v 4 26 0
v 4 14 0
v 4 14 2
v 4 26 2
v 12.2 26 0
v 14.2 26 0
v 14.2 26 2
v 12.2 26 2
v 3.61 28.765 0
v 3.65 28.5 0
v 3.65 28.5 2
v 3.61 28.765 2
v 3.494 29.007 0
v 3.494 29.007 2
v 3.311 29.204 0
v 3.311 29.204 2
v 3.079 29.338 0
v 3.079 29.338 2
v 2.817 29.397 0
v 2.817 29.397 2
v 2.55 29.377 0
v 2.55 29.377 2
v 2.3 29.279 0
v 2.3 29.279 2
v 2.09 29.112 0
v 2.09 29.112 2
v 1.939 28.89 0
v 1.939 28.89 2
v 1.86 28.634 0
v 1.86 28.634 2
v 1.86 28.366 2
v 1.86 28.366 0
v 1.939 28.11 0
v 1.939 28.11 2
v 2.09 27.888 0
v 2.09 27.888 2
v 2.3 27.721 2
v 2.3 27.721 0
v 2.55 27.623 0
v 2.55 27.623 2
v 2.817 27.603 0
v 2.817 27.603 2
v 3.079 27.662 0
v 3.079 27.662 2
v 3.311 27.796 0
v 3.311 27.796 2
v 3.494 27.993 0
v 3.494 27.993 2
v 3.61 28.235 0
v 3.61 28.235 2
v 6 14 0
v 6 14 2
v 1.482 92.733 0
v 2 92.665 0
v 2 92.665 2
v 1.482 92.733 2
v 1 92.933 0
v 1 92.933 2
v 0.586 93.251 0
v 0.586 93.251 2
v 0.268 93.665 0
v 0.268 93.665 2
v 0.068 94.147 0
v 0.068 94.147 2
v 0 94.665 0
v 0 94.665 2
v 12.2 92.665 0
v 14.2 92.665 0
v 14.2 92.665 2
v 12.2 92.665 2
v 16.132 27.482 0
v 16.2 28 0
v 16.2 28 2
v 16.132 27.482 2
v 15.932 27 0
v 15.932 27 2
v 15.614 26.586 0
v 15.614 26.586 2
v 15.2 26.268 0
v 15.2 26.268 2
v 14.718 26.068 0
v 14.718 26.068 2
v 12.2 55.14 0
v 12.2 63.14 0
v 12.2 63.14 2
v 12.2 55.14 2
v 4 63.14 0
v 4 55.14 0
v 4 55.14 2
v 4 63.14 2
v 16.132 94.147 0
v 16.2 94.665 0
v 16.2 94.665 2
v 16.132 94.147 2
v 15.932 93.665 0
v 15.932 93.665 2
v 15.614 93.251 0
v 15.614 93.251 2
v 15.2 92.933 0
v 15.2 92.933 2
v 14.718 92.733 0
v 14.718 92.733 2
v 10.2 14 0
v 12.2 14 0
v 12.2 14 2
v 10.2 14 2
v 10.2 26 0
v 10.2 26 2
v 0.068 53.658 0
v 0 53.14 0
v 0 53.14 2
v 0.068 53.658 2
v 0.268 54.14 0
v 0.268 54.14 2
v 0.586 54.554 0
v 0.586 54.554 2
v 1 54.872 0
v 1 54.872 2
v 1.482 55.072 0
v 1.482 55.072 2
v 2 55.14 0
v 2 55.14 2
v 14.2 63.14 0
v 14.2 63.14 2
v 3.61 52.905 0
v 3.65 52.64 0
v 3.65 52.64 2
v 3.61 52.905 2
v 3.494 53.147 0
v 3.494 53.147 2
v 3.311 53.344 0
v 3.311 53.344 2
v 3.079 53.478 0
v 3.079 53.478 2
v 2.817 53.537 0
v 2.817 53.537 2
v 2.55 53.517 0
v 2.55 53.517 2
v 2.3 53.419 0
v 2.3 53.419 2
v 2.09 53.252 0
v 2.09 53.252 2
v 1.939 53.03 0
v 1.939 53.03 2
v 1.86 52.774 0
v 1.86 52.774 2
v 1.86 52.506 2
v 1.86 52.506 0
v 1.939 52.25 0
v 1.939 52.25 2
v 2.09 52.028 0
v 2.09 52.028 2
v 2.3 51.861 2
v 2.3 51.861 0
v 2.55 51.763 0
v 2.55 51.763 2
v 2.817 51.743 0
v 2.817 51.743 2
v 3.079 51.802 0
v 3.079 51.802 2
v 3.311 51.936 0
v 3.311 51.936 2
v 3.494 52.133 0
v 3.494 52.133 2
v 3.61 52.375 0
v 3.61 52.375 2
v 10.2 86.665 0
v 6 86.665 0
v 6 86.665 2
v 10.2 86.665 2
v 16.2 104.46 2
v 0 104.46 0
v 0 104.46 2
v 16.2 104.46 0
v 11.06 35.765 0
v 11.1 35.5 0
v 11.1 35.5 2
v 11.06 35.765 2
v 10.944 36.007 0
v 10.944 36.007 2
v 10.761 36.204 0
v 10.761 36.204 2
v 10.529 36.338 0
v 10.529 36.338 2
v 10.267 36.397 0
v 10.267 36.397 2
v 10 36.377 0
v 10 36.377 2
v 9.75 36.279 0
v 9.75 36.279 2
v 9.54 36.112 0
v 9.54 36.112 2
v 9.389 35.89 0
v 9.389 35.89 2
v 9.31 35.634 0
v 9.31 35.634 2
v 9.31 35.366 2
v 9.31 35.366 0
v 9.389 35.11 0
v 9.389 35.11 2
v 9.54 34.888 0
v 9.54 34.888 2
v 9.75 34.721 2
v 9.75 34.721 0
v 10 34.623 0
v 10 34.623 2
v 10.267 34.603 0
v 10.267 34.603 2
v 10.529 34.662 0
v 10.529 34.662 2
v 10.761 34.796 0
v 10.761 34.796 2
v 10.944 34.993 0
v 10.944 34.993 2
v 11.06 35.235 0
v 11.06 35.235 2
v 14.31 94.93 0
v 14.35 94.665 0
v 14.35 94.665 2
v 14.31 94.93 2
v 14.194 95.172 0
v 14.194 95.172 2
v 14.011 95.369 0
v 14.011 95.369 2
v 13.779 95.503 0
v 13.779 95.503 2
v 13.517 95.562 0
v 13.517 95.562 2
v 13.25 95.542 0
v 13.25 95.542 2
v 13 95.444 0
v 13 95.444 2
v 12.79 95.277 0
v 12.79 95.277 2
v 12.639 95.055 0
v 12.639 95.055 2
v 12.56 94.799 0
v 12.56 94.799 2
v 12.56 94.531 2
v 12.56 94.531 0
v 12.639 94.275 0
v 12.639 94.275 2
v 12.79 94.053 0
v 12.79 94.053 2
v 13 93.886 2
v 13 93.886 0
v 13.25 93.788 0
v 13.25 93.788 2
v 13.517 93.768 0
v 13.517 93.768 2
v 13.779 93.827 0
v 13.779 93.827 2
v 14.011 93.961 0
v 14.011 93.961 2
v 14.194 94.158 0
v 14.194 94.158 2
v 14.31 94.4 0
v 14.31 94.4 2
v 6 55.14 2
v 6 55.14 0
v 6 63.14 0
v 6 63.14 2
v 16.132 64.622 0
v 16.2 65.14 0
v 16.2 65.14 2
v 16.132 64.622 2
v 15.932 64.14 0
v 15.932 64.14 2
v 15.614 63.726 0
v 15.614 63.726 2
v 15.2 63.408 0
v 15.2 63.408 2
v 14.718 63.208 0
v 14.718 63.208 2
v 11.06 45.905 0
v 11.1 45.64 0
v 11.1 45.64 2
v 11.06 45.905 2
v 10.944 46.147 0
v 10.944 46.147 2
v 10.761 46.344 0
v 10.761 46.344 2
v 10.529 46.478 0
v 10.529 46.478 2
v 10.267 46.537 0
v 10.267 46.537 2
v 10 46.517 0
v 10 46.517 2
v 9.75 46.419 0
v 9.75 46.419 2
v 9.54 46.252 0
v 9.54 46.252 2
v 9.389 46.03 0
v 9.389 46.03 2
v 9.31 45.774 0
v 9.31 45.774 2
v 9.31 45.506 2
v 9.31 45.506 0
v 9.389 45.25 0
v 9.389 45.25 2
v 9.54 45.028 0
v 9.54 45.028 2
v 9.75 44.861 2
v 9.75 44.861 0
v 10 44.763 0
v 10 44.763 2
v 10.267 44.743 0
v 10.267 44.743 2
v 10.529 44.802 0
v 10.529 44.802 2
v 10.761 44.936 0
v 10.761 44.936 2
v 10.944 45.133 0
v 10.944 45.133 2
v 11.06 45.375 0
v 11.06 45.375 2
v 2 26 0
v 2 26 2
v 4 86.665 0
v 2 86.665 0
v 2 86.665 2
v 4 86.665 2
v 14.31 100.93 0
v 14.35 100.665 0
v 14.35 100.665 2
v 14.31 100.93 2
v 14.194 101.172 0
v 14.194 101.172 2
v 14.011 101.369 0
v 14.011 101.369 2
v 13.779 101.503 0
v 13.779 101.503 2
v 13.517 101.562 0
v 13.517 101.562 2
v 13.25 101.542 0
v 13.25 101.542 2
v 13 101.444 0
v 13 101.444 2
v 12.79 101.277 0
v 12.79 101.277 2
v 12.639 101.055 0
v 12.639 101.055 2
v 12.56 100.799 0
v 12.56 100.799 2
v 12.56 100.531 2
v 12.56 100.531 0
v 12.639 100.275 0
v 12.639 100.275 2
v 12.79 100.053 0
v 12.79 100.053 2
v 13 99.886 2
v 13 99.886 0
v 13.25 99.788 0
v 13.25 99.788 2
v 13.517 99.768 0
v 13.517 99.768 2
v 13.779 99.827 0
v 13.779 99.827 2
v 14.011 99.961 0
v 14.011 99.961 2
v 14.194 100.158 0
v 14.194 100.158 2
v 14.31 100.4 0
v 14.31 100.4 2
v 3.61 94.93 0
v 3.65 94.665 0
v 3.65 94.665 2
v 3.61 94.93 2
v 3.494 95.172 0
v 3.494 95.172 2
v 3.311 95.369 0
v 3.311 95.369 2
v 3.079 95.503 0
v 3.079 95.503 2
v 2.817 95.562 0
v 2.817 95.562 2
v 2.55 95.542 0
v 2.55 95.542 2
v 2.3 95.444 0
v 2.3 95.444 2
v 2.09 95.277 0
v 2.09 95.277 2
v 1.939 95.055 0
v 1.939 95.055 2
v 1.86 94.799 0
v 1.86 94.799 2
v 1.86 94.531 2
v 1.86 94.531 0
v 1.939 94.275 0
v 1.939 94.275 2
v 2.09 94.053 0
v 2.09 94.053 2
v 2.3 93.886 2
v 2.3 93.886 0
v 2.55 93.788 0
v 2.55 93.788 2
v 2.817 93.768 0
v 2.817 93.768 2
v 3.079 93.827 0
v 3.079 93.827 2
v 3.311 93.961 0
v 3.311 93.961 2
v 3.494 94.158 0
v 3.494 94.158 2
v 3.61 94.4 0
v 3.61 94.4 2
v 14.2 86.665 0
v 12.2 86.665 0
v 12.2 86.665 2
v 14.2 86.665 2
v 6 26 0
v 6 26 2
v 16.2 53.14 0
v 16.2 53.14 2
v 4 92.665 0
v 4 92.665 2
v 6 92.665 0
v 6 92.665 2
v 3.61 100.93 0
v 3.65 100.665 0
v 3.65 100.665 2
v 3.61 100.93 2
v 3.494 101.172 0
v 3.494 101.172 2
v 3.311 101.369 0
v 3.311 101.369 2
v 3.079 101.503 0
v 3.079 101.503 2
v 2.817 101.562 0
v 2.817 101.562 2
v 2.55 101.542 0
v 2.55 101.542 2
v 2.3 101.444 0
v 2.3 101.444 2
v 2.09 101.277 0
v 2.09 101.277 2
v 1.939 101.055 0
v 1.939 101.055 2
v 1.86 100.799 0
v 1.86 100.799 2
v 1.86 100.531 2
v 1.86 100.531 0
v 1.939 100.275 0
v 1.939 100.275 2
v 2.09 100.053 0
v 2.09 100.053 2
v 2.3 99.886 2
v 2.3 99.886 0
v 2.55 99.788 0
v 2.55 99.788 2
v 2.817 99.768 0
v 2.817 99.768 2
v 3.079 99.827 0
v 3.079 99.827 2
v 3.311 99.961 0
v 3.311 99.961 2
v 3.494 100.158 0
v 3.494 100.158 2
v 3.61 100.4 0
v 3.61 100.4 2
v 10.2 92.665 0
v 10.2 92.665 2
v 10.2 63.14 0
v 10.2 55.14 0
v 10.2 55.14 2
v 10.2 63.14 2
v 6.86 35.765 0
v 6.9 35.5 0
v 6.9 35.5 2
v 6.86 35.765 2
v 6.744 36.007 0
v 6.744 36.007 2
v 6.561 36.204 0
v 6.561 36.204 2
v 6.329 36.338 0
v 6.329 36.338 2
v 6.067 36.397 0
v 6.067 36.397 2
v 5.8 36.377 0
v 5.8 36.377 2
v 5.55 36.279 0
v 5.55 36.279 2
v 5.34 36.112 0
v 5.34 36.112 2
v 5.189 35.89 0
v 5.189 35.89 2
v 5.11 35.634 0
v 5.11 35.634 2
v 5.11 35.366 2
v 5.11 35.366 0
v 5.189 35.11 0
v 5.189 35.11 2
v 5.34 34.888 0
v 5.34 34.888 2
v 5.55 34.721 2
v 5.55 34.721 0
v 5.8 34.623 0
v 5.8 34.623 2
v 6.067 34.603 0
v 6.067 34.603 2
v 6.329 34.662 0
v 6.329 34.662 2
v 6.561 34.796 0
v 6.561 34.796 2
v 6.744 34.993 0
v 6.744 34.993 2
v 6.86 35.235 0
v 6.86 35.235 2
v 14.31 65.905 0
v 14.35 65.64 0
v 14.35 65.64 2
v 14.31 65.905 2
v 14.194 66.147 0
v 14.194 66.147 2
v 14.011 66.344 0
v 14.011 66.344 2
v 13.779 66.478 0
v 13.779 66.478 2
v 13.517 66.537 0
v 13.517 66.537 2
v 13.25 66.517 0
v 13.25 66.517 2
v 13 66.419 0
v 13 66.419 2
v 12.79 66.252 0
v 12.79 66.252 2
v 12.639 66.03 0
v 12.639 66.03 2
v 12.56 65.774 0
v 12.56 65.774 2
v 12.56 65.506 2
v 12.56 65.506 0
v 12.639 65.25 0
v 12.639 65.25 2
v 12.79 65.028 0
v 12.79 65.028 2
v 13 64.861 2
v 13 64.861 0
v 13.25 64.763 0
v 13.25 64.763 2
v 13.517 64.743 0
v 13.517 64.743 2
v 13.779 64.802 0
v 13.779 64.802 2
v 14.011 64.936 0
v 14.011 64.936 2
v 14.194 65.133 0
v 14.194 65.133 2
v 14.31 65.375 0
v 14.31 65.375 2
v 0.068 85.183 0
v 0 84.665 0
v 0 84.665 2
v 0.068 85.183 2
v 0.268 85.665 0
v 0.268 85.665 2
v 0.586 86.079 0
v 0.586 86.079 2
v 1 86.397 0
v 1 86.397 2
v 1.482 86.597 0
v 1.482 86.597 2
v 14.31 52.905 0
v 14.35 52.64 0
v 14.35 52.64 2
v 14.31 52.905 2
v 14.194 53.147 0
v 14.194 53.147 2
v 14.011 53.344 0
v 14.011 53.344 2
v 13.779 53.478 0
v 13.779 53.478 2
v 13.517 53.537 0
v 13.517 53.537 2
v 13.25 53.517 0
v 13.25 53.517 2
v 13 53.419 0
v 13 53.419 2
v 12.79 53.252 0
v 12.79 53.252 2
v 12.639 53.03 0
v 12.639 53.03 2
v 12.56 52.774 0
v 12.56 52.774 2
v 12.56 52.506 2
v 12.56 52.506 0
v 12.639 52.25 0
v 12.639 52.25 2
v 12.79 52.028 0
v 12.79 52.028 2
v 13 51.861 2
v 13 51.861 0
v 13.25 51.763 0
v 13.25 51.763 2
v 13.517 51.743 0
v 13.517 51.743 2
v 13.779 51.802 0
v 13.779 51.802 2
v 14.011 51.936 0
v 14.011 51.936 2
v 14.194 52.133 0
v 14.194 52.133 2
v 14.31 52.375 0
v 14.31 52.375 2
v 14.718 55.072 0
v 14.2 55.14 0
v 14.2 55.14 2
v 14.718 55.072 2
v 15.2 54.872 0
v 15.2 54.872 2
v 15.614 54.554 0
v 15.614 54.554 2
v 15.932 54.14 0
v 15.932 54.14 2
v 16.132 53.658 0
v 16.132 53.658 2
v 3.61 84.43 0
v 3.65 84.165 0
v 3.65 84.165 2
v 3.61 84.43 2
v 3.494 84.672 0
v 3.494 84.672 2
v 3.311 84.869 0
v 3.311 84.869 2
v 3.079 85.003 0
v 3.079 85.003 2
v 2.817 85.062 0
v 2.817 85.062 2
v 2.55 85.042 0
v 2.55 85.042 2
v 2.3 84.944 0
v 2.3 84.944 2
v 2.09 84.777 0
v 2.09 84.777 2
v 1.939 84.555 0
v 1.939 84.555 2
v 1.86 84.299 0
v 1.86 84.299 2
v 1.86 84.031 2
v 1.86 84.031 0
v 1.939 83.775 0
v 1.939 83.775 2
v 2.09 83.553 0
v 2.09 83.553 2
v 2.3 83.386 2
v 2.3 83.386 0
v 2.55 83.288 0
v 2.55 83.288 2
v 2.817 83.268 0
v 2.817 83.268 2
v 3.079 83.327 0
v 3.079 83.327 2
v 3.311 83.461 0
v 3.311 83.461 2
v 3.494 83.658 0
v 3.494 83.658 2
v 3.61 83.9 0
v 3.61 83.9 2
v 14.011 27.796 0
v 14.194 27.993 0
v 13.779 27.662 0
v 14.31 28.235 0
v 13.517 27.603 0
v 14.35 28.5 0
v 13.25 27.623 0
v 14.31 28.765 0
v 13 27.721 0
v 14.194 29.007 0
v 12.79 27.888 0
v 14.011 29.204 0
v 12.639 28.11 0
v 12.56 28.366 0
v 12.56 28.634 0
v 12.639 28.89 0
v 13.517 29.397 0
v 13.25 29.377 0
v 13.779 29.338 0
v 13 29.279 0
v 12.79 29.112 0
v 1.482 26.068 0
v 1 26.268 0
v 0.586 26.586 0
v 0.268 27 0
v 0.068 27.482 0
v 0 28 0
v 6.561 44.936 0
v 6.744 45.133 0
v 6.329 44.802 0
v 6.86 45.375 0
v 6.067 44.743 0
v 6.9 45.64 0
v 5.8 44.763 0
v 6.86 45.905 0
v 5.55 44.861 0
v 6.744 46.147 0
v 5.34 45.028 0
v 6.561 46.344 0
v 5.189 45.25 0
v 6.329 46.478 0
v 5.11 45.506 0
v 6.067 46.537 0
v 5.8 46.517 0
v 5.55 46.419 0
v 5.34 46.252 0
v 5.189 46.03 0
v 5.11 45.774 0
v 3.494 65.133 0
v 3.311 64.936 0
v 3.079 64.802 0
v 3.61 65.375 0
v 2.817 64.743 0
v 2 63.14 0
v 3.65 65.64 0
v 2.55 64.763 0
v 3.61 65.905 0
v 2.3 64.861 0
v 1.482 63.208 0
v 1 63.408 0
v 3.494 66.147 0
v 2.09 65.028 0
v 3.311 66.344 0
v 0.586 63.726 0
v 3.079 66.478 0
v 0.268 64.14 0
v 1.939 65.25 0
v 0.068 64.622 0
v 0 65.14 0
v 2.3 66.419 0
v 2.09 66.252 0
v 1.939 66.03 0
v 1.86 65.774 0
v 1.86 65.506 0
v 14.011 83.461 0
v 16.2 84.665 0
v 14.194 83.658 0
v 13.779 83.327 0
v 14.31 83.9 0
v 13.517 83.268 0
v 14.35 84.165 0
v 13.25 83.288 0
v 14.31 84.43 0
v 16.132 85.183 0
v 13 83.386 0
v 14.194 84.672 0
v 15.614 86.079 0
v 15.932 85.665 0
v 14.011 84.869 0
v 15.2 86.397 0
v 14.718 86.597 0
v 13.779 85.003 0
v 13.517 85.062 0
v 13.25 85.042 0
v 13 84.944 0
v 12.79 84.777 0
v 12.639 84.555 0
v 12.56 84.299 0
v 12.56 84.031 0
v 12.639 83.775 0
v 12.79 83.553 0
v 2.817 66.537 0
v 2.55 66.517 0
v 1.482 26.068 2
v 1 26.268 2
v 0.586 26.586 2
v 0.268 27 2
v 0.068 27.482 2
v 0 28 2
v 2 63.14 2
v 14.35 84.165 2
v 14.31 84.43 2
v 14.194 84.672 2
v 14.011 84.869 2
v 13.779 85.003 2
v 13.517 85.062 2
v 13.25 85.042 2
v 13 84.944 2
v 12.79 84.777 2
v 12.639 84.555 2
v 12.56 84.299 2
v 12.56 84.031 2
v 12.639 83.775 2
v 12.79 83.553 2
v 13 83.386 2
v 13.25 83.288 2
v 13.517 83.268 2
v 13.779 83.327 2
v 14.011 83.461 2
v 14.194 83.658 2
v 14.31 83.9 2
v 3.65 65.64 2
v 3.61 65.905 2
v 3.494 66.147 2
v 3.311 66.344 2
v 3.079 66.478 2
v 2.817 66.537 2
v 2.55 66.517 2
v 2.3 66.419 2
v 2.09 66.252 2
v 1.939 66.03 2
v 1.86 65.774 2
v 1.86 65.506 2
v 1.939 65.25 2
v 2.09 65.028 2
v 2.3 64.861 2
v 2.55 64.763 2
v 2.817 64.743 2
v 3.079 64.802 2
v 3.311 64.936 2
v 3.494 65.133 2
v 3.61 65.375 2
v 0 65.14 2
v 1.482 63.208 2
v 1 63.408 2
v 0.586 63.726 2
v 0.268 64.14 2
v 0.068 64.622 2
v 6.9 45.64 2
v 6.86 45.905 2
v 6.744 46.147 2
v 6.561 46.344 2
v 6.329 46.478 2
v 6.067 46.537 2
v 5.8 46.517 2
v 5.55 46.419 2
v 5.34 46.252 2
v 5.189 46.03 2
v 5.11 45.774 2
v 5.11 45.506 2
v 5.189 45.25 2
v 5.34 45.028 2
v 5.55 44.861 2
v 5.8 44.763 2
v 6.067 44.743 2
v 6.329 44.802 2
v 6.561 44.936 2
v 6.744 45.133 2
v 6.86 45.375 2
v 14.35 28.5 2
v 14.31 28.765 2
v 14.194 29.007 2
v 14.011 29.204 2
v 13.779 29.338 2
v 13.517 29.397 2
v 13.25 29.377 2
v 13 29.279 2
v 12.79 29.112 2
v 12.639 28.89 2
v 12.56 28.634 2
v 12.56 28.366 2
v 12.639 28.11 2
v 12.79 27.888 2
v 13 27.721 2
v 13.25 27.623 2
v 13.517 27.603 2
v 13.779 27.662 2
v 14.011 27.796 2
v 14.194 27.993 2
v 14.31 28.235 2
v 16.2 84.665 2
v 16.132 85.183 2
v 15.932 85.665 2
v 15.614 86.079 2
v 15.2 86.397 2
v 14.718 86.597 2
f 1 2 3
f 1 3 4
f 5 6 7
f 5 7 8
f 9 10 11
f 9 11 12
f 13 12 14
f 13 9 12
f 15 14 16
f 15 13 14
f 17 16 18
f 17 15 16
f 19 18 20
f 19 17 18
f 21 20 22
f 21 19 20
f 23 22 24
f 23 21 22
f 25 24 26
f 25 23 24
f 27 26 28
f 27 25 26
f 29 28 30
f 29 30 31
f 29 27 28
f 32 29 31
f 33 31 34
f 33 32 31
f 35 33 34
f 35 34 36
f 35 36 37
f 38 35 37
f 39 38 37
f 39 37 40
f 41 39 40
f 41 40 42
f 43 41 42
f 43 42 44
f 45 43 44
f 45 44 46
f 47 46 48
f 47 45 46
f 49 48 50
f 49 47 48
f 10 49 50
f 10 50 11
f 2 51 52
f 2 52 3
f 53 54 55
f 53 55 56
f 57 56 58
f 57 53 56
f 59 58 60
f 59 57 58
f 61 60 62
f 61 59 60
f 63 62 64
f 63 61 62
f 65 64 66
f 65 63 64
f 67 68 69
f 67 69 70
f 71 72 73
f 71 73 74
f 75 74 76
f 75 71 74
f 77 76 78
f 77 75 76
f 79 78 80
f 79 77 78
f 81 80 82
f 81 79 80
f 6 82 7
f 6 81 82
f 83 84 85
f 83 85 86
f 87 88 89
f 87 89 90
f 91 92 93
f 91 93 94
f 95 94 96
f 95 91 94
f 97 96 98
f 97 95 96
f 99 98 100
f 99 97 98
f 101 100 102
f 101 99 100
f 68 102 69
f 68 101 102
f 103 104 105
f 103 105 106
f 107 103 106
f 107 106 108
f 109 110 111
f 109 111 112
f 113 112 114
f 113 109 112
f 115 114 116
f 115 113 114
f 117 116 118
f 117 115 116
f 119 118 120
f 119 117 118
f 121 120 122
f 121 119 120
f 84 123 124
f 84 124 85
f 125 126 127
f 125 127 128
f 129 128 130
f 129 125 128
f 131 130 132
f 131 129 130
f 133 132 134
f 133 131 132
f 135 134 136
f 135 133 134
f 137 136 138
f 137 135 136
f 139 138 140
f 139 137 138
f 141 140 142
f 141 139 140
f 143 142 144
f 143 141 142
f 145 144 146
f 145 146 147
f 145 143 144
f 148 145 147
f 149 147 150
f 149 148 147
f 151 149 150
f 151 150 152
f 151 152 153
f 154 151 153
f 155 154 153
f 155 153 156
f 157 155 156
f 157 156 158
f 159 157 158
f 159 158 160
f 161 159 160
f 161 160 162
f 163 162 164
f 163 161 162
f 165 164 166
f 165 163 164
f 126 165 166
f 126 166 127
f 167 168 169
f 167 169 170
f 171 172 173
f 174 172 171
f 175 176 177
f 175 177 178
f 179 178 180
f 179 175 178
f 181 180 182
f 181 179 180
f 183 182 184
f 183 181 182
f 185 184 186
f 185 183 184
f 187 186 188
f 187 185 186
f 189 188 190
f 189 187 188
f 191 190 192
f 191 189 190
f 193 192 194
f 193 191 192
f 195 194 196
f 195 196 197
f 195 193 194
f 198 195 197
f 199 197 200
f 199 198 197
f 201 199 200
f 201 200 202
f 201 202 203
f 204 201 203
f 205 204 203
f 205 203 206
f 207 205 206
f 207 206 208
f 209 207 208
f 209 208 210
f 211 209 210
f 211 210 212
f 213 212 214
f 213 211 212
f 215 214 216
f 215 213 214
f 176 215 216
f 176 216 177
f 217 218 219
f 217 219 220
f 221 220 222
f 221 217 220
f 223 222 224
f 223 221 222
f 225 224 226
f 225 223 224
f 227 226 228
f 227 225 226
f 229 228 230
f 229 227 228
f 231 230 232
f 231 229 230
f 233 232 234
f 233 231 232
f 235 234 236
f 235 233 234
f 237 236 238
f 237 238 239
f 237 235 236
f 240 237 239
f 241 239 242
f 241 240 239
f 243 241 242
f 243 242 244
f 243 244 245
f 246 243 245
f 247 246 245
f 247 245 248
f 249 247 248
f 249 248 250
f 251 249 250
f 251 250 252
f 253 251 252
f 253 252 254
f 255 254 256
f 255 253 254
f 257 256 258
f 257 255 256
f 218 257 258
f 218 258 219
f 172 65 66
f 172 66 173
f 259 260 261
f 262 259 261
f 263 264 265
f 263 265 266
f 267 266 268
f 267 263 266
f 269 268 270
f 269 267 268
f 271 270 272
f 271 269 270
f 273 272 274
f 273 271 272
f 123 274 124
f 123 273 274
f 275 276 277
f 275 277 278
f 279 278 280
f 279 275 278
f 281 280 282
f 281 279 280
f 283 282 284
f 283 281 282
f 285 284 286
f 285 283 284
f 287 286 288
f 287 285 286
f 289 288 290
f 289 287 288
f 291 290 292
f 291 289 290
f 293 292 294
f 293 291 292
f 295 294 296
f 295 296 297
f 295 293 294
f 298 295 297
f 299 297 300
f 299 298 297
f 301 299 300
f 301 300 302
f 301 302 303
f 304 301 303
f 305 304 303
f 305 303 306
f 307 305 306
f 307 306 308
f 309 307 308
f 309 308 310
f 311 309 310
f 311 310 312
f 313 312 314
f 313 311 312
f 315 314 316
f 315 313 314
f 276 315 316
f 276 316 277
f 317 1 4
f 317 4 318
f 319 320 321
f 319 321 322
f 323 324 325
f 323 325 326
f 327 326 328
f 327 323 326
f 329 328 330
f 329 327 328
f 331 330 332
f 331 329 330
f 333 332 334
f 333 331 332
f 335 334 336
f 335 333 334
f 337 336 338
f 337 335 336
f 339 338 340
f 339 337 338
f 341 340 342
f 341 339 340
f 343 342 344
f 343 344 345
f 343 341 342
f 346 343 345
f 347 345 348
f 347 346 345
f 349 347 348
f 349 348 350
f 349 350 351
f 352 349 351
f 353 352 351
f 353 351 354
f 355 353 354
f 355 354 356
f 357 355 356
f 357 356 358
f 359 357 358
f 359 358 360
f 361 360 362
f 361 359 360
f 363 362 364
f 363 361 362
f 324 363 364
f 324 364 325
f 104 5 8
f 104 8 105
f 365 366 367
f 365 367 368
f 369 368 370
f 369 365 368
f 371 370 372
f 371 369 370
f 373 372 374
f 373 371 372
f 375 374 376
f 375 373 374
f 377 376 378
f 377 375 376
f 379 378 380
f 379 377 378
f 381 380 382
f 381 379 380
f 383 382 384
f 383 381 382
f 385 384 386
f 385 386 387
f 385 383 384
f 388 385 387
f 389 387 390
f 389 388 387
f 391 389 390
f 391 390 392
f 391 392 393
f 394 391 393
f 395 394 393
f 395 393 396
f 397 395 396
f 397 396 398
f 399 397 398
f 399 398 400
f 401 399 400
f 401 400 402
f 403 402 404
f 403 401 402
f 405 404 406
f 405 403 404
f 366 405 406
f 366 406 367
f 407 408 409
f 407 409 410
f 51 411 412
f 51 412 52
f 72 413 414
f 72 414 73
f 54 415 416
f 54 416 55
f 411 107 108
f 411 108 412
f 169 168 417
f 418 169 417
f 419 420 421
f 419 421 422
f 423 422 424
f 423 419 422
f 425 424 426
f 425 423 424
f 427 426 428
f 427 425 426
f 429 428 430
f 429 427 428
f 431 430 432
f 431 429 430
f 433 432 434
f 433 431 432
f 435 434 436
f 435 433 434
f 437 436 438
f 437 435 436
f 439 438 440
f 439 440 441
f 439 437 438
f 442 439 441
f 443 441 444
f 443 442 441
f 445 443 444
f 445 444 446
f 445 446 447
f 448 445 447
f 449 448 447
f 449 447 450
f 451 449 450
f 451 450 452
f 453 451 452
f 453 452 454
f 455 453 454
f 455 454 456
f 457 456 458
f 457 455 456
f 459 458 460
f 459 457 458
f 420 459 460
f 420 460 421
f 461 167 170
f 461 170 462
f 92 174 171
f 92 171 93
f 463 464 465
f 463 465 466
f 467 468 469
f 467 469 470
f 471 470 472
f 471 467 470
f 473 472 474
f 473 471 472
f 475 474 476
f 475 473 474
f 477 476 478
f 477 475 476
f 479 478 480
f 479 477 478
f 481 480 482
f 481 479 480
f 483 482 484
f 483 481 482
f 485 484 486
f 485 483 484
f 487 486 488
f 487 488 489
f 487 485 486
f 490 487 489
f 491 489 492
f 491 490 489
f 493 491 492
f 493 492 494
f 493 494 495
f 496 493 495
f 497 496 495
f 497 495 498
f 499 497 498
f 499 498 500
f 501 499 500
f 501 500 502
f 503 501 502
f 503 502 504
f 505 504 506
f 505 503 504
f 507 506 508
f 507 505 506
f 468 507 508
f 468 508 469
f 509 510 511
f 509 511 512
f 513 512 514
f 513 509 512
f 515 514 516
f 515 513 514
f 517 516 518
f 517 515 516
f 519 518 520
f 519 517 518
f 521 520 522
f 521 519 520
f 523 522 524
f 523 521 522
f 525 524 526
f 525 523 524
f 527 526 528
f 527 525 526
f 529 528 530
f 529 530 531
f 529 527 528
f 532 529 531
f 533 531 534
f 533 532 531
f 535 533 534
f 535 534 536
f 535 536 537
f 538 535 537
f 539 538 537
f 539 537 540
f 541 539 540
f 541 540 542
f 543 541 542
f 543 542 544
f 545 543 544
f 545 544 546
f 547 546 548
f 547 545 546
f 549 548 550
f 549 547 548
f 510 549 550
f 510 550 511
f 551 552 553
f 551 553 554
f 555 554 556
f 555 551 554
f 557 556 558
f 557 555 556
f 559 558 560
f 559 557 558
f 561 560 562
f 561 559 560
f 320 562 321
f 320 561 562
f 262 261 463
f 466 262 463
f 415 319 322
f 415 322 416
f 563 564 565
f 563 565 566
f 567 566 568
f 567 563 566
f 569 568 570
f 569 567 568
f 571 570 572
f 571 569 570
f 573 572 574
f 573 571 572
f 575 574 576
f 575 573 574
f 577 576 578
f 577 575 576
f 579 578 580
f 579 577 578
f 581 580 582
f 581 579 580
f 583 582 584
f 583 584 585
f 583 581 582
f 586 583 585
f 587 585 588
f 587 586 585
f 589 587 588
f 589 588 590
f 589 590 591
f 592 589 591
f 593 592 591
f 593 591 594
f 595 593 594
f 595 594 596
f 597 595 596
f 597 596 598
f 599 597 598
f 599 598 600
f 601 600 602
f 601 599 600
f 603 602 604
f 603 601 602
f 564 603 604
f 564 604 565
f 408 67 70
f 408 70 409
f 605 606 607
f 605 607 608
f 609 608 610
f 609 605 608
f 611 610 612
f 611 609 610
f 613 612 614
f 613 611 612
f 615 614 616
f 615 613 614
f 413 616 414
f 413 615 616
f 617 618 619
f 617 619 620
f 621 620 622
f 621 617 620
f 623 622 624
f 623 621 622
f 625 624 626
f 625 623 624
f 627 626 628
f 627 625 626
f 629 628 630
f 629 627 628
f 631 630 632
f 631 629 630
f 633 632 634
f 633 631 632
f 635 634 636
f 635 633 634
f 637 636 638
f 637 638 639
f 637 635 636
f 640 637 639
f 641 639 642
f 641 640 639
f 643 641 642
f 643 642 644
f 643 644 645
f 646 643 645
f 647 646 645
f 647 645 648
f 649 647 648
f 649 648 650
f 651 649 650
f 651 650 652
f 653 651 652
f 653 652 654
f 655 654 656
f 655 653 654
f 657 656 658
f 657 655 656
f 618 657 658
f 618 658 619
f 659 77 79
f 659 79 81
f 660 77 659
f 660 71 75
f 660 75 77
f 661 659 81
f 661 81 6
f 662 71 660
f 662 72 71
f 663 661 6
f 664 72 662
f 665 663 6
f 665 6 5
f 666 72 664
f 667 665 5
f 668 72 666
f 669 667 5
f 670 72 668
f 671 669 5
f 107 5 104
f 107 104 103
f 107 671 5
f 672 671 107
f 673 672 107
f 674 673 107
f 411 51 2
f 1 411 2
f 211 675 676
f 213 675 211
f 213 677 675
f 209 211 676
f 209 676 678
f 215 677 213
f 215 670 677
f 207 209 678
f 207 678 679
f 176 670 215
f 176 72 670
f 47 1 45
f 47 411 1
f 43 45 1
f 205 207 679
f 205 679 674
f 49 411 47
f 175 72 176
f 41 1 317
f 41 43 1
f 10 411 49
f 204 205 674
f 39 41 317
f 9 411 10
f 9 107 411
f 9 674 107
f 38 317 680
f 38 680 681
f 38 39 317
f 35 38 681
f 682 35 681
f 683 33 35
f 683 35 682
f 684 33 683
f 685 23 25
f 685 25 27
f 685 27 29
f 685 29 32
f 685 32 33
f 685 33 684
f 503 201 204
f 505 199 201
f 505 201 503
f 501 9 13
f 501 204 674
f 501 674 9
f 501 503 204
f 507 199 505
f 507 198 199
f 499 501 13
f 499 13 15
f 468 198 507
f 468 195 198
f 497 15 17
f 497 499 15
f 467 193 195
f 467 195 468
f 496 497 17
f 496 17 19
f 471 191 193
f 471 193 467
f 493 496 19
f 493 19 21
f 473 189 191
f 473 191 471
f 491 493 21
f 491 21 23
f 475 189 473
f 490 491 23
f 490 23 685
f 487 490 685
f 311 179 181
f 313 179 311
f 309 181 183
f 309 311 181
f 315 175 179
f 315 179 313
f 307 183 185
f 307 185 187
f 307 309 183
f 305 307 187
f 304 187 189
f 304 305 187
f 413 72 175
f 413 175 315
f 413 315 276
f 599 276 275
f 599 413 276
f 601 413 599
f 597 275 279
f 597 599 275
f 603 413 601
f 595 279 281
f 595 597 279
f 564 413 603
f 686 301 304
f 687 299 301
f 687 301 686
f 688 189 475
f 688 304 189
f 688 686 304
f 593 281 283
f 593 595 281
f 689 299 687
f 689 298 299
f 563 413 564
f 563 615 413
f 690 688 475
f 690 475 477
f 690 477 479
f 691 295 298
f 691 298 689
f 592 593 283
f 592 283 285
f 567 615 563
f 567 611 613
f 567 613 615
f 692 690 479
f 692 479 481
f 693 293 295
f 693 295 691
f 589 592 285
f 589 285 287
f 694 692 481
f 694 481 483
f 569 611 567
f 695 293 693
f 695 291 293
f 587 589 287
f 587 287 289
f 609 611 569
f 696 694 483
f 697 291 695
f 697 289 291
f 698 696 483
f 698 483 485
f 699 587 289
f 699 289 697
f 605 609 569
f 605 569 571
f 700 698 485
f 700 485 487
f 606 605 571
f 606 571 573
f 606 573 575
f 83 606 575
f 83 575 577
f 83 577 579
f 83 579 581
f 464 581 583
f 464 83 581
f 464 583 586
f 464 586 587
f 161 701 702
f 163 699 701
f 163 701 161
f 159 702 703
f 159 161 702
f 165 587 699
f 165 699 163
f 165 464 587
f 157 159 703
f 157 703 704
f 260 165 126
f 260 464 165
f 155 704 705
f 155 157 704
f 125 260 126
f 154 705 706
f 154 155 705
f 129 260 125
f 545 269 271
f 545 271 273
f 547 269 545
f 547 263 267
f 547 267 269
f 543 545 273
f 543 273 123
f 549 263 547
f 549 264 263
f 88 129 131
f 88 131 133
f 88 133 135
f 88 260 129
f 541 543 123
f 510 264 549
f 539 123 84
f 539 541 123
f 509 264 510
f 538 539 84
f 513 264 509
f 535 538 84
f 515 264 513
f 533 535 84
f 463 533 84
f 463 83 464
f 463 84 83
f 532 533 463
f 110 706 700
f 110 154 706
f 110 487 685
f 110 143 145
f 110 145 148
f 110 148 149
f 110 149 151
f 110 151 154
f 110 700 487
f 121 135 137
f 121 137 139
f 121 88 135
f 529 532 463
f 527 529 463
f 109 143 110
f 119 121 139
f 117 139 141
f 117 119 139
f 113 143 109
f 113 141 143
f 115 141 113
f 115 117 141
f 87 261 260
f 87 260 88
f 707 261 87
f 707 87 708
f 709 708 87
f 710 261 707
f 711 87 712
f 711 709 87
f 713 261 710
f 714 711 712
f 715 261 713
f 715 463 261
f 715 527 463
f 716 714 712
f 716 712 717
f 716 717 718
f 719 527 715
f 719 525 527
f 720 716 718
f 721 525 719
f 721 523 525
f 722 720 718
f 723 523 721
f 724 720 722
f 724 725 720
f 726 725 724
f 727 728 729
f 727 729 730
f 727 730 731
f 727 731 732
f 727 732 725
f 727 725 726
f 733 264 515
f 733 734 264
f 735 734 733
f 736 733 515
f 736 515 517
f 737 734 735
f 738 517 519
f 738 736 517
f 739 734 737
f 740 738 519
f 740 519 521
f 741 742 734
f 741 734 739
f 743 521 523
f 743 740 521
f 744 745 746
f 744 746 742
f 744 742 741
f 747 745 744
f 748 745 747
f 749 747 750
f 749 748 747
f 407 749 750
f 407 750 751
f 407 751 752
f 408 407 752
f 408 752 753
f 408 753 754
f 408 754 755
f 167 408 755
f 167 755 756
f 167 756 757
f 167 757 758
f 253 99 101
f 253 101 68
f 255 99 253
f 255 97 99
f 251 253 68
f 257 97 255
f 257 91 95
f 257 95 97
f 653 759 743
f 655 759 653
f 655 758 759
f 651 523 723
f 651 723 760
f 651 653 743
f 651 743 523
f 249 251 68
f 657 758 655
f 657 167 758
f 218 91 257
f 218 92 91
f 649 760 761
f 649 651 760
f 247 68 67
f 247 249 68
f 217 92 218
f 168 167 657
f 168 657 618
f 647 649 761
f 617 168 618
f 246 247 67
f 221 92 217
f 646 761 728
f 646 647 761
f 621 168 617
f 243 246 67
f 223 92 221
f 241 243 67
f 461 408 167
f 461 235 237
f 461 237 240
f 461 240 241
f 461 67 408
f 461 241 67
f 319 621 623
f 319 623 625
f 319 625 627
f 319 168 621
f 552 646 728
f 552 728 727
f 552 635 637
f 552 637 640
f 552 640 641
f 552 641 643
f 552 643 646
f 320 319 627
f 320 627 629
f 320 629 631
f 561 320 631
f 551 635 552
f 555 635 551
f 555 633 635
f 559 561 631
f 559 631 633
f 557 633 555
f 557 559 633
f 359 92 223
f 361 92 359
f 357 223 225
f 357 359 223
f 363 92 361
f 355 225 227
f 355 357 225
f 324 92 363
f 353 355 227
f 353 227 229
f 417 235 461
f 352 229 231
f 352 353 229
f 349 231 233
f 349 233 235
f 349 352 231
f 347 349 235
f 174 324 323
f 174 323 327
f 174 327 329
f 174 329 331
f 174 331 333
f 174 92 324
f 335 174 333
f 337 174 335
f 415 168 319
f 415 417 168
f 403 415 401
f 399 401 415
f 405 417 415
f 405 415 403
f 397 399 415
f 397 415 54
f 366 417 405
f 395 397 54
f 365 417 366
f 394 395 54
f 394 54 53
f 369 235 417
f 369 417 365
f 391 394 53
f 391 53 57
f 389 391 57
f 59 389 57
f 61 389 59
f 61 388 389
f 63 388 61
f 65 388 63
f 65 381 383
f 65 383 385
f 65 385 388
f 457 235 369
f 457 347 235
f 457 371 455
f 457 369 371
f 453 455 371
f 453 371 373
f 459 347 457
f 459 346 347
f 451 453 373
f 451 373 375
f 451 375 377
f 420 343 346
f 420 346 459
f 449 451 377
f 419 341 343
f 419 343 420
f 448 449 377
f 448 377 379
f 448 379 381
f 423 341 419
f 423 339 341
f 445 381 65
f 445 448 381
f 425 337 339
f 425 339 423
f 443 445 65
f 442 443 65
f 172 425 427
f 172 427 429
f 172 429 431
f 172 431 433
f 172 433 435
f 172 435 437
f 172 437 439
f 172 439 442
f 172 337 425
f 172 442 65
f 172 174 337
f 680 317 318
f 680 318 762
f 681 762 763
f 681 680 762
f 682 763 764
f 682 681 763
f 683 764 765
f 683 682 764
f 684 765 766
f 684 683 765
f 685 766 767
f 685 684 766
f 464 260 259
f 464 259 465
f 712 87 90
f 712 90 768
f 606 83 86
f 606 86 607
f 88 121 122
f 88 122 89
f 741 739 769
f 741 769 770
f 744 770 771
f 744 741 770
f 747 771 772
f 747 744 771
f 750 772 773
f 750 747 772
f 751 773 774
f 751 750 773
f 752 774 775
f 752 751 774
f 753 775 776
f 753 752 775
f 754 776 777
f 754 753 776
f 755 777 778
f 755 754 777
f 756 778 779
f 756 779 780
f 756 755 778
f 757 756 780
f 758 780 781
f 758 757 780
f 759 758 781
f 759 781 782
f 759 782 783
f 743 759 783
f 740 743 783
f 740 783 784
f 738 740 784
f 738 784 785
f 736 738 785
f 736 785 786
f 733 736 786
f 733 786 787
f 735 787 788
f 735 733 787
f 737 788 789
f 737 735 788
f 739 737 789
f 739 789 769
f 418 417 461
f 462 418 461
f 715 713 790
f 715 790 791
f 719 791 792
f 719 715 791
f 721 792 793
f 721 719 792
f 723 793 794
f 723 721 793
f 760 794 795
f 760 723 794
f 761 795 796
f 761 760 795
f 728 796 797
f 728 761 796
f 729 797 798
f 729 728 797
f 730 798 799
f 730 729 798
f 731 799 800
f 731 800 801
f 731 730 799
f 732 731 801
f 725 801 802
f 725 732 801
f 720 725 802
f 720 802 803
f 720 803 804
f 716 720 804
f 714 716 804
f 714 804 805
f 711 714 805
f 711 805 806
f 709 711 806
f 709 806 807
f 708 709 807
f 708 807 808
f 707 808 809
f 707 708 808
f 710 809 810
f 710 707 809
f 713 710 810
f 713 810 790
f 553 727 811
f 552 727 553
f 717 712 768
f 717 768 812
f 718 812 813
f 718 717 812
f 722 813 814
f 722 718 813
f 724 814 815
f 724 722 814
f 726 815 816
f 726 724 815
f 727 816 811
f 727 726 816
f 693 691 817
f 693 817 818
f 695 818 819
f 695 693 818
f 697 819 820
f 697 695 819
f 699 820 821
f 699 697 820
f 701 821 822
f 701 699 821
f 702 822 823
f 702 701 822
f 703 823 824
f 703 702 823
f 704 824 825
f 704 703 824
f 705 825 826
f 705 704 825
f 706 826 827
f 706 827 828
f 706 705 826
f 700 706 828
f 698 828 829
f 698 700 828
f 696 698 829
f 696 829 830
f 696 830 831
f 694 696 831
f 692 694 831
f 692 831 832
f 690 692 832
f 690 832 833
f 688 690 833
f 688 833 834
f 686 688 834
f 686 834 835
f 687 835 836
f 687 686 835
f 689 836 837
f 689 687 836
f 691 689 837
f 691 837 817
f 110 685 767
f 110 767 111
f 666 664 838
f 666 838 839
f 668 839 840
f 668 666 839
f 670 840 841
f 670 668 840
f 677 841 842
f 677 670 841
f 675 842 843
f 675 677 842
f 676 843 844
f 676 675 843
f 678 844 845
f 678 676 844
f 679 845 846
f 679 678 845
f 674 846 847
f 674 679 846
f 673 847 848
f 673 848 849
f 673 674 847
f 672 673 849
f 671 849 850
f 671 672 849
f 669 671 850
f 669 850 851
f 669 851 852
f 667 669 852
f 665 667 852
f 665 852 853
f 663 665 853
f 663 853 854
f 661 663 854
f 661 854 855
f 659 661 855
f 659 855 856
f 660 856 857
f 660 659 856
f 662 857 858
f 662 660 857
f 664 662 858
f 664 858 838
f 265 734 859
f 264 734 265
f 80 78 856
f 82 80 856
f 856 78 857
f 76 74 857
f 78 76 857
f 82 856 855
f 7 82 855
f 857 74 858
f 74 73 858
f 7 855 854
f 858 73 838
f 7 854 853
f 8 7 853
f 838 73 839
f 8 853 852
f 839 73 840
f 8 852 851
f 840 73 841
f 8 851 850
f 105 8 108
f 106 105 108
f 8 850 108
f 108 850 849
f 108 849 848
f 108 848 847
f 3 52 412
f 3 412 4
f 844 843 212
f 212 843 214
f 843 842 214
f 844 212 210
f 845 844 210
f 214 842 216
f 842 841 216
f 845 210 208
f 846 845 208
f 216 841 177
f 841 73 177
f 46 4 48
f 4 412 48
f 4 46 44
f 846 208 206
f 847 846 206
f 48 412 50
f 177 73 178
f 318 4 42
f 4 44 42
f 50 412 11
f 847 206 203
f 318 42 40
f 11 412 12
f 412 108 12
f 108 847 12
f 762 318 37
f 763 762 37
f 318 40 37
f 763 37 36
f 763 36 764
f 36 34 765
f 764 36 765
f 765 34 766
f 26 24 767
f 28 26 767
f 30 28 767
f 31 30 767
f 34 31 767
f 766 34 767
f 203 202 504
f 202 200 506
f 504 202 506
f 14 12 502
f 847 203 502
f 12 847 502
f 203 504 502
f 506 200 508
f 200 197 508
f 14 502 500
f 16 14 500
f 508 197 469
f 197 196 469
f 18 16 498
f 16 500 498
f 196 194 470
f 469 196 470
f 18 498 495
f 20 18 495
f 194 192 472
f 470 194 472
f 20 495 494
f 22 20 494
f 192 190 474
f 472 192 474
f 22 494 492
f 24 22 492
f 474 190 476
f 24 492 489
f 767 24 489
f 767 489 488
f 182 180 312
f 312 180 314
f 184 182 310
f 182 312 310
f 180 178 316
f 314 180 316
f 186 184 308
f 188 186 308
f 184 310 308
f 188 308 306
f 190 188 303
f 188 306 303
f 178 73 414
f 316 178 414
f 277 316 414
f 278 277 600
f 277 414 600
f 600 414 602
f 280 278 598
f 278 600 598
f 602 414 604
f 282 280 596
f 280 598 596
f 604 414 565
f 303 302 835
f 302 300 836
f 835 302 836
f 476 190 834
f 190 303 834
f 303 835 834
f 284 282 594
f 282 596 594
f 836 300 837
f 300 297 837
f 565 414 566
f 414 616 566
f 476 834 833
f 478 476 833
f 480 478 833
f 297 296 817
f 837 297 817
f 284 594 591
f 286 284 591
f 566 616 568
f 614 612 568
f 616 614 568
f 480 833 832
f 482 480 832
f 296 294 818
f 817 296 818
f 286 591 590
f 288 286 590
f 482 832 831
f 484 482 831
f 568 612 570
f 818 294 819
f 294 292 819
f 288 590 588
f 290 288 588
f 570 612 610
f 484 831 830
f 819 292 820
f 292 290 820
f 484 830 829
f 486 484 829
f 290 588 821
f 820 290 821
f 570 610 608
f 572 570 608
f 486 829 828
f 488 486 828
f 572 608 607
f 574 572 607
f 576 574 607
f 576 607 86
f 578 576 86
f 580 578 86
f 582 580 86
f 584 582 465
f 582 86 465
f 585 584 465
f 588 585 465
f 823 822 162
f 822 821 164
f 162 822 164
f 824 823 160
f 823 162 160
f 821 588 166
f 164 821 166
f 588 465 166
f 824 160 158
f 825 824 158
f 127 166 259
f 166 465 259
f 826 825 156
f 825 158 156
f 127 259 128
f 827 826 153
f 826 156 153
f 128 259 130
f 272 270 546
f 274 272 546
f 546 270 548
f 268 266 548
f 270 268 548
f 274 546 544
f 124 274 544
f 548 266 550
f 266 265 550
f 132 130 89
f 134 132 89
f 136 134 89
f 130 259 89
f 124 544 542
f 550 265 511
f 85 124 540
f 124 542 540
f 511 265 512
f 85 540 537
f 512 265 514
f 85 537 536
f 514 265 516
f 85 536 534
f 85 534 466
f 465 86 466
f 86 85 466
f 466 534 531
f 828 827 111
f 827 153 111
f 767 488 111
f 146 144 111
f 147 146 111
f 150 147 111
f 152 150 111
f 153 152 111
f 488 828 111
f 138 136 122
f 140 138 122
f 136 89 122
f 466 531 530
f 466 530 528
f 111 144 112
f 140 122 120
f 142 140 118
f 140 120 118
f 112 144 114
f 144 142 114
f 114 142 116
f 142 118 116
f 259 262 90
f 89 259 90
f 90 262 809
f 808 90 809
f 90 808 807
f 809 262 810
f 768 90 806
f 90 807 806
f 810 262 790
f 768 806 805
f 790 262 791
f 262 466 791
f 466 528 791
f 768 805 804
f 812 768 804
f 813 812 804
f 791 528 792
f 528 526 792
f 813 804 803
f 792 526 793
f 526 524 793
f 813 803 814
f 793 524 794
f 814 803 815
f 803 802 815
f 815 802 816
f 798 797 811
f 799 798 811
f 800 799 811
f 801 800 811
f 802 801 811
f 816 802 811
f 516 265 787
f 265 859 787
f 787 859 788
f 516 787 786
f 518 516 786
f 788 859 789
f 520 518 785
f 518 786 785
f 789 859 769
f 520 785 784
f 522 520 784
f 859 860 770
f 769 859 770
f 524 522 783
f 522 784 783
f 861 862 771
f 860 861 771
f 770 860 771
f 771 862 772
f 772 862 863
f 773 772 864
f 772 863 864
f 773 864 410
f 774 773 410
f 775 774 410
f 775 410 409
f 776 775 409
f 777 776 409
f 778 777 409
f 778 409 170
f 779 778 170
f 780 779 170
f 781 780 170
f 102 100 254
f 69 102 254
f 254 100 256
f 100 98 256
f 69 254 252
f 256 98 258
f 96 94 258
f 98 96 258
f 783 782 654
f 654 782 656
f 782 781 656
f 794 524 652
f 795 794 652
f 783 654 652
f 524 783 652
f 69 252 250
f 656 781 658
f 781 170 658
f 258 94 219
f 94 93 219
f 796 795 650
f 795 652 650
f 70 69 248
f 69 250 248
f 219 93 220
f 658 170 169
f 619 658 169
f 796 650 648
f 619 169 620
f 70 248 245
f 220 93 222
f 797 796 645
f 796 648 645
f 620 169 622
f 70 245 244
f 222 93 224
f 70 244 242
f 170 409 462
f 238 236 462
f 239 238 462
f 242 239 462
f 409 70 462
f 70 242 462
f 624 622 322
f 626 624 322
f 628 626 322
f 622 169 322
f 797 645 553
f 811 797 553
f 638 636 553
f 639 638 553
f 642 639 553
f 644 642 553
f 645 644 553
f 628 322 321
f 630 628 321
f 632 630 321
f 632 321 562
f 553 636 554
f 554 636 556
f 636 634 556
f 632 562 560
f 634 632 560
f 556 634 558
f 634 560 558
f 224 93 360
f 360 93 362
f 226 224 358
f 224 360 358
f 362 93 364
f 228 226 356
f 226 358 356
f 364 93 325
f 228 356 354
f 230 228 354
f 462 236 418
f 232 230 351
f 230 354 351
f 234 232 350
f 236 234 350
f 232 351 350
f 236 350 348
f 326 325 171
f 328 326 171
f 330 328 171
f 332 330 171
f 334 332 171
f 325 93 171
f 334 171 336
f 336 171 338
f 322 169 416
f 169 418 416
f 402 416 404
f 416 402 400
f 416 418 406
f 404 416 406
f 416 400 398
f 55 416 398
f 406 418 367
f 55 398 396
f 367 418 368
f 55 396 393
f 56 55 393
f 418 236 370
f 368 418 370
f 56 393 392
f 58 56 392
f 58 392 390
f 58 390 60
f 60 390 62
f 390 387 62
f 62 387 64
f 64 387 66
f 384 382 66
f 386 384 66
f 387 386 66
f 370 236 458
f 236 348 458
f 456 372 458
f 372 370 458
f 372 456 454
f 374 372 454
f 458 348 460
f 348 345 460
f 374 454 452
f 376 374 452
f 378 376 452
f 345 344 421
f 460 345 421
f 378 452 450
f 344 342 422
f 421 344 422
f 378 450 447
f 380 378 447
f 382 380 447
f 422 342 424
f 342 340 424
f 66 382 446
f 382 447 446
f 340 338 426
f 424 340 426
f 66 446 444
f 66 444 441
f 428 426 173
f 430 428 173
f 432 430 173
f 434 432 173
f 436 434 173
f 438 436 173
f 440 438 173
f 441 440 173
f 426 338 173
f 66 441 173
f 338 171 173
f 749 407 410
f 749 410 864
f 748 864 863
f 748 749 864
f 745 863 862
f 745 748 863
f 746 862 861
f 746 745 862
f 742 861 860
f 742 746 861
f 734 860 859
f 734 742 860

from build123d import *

# Parameters (mm, degrees)
SKETCH1_R           = 0.9
SKETCH1_W           = 4.2
SKETCH1_H           = 8
SKETCH1_H_2         = 6
BOSS_EXTRUDE1_DEPTH = 2


with BuildPart() as part:
    # Sketch1 → Boss-Extrude1 (new body)
    with BuildSketch(Plane.XY):
        with BuildLine():
            Line((4, 26), (2, 26))
            ThreePointArc((2, 26), (0.585786438, 26.585786438), (0, 28))
            Line((0, 28), (0, 53.14))
            ThreePointArc((0, 53.14), (0.585786438, 54.554213562), (2, 55.14))
            Line((2, 55.14), (4, 55.14))
            Line((4, 55.14), (4, 63.14))
            Line((4, 63.14), (2, 63.14))
            ThreePointArc((2, 63.14), (0.585786438, 63.725786438), (0, 65.14))
            Line((0, 65.14), (0, 84.665))
            ThreePointArc((0, 84.665), (0.585786438, 86.079213562), (2, 86.665))
            Line((2, 86.665), (4, 86.665))
            Line((4, 86.665), (4, 92.665))
            Line((4, 92.665), (2, 92.665))
            ThreePointArc((2, 92.665), (0.585786438, 93.250786438), (0, 94.665))
            Line((0, 94.665), (0, 104.46))
            Line((0, 104.46), (16.2, 104.46))
            Line((16.2, 104.46), (16.2, 94.665))
            ThreePointArc((16.2, 94.665), (15.614213562, 93.250786438), (14.2, 92.665))
            Line((14.2, 92.665), (12.2, 92.665))
            Line((12.2, 92.665), (12.2, 86.665))
            Line((12.2, 86.665), (14.2, 86.665))
            ThreePointArc((14.2, 86.665), (15.614213562, 86.079213562), (16.2, 84.665))
            Line((16.2, 84.665), (16.2, 65.14))
            ThreePointArc((16.2, 65.14), (15.614213562, 63.725786438), (14.2, 63.14))
            Line((14.2, 63.14), (12.2, 63.14))
            Line((12.2, 63.14), (12.2, 55.14))
            Line((12.2, 55.14), (14.2, 55.14))
            ThreePointArc((14.2, 55.14), (15.614213562, 54.554213562), (16.2, 53.14))
            Line((16.2, 53.14), (16.2, 28))
            ThreePointArc((16.2, 28), (15.614213562, 26.585786438), (14.2, 26))
            Line((14.2, 26), (12.2, 26))
            Line((12.2, 26), (12.2, 14))
            Line((12.2, 14), (10.2, 14))
            Line((10.2, 14), (10.2, 26))
            Line((10.2, 26), (6, 26))
            Line((6, 26), (6, 14))
            Line((6, 14), (4, 14))
            Line((4, 14), (4, 26))
        make_face()
        with Locations((13.45, 94.665)):
            Circle(SKETCH1_R, mode=Mode.SUBTRACT)
        with Locations((13.45, 84.165)):
            Circle(SKETCH1_R, mode=Mode.SUBTRACT)
        with Locations((13.45, 65.64)):
            Circle(SKETCH1_R, mode=Mode.SUBTRACT)
        with Locations((13.45, 52.64)):
            Circle(SKETCH1_R, mode=Mode.SUBTRACT)
        with Locations((13.45, 28.5)):
            Circle(SKETCH1_R, mode=Mode.SUBTRACT)
        with Locations((10.2, 35.5)):
            Circle(SKETCH1_R, mode=Mode.SUBTRACT)
        with Locations((10.2, 45.64)):
            Circle(SKETCH1_R, mode=Mode.SUBTRACT)
        with Locations((13.45, 100.665)):
            Circle(SKETCH1_R, mode=Mode.SUBTRACT)
        with Locations((2.75, 100.665)):
            Circle(SKETCH1_R, mode=Mode.SUBTRACT)
        with Locations((6, 45.64)):
            Circle(SKETCH1_R, mode=Mode.SUBTRACT)
        with Locations((6, 35.5)):
            Circle(SKETCH1_R, mode=Mode.SUBTRACT)
        with Locations((2.75, 28.5)):
            Circle(SKETCH1_R, mode=Mode.SUBTRACT)
        with Locations((2.75, 52.64)):
            Circle(SKETCH1_R, mode=Mode.SUBTRACT)
        with Locations((2.75, 65.64)):
            Circle(SKETCH1_R, mode=Mode.SUBTRACT)
        with Locations((2.75, 84.165)):
            Circle(SKETCH1_R, mode=Mode.SUBTRACT)
        with Locations((2.75, 94.665)):
            Circle(SKETCH1_R, mode=Mode.SUBTRACT)
        with Locations((8.1, 59.14)):
            Rectangle(SKETCH1_W, SKETCH1_H, mode=Mode.SUBTRACT)
        with Locations((8.1, 89.665)):
            Rectangle(SKETCH1_W, SKETCH1_H_2, mode=Mode.SUBTRACT)
    extrude(amount=BOSS_EXTRUDE1_DEPTH)


solid = part.part
